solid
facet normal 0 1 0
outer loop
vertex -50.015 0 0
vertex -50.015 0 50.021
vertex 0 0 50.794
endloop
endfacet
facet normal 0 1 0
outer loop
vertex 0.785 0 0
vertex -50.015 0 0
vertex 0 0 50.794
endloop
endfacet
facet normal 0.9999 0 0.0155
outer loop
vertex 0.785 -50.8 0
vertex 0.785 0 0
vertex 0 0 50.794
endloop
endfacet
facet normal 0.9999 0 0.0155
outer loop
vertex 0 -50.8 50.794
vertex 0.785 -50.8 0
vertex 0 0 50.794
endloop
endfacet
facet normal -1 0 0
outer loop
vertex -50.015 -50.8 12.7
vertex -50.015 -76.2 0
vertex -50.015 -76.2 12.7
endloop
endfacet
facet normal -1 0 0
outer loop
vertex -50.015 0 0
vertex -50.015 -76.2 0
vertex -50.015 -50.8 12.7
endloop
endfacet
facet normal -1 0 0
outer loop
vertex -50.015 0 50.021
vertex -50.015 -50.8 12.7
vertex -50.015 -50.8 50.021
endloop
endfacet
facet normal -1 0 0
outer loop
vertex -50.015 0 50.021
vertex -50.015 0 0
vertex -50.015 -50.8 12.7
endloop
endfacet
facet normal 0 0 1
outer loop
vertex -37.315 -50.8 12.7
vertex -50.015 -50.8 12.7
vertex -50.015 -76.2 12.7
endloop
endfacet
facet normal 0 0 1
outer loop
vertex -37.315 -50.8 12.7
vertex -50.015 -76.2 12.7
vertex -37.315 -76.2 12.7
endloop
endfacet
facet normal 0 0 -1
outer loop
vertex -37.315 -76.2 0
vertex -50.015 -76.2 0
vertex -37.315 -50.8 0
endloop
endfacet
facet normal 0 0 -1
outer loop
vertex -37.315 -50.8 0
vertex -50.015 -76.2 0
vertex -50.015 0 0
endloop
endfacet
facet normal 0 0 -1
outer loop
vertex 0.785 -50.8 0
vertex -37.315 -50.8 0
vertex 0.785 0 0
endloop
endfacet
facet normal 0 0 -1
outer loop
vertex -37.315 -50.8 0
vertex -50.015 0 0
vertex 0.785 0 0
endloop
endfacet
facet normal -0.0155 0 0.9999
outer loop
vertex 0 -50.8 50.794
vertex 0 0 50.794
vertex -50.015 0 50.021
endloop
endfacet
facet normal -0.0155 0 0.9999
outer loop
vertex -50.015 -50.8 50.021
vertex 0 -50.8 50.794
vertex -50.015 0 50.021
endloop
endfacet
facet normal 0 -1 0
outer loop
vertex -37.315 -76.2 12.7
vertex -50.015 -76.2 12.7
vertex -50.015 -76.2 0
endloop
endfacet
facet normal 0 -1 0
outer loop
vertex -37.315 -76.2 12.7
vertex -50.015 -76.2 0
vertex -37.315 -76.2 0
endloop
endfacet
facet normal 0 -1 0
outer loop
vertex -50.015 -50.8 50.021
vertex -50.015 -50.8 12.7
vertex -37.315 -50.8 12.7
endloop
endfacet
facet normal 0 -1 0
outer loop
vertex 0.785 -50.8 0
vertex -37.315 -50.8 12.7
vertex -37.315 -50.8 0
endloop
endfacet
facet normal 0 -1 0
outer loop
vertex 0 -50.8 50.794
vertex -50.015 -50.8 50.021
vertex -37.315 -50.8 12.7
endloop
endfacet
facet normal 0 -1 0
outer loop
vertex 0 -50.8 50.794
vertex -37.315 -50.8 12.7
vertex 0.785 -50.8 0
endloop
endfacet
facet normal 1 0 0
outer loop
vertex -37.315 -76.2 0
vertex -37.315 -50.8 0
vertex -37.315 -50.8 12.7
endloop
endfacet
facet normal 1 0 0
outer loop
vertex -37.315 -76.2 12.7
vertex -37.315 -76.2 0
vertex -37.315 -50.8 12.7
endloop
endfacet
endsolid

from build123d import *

# Parameters (mm, degrees)
F1_DEPTH = 50.8
F2_W     = 12.7
F2_H     = 12.7
F3_DEPTH = 25.4


with BuildPart() as f1:
    # F0 (on Front) → F1 (new body)
    with BuildSketch(Plane.XZ):
        Polygon((0, 50.79394), (-50.015371, 50.021338), (-50.015371, 0), (0.784629, 0), align=None)
    extrude(amount=F1_DEPTH)

    # F2 (on face) → F3 (join)
    with BuildSketch(Plane.XZ.offset(50.8)):
        with Locations((-43.665371, 6.35)):
            Rectangle(F2_W, F2_H)
    extrude(amount=F3_DEPTH)


solid = f1.part
